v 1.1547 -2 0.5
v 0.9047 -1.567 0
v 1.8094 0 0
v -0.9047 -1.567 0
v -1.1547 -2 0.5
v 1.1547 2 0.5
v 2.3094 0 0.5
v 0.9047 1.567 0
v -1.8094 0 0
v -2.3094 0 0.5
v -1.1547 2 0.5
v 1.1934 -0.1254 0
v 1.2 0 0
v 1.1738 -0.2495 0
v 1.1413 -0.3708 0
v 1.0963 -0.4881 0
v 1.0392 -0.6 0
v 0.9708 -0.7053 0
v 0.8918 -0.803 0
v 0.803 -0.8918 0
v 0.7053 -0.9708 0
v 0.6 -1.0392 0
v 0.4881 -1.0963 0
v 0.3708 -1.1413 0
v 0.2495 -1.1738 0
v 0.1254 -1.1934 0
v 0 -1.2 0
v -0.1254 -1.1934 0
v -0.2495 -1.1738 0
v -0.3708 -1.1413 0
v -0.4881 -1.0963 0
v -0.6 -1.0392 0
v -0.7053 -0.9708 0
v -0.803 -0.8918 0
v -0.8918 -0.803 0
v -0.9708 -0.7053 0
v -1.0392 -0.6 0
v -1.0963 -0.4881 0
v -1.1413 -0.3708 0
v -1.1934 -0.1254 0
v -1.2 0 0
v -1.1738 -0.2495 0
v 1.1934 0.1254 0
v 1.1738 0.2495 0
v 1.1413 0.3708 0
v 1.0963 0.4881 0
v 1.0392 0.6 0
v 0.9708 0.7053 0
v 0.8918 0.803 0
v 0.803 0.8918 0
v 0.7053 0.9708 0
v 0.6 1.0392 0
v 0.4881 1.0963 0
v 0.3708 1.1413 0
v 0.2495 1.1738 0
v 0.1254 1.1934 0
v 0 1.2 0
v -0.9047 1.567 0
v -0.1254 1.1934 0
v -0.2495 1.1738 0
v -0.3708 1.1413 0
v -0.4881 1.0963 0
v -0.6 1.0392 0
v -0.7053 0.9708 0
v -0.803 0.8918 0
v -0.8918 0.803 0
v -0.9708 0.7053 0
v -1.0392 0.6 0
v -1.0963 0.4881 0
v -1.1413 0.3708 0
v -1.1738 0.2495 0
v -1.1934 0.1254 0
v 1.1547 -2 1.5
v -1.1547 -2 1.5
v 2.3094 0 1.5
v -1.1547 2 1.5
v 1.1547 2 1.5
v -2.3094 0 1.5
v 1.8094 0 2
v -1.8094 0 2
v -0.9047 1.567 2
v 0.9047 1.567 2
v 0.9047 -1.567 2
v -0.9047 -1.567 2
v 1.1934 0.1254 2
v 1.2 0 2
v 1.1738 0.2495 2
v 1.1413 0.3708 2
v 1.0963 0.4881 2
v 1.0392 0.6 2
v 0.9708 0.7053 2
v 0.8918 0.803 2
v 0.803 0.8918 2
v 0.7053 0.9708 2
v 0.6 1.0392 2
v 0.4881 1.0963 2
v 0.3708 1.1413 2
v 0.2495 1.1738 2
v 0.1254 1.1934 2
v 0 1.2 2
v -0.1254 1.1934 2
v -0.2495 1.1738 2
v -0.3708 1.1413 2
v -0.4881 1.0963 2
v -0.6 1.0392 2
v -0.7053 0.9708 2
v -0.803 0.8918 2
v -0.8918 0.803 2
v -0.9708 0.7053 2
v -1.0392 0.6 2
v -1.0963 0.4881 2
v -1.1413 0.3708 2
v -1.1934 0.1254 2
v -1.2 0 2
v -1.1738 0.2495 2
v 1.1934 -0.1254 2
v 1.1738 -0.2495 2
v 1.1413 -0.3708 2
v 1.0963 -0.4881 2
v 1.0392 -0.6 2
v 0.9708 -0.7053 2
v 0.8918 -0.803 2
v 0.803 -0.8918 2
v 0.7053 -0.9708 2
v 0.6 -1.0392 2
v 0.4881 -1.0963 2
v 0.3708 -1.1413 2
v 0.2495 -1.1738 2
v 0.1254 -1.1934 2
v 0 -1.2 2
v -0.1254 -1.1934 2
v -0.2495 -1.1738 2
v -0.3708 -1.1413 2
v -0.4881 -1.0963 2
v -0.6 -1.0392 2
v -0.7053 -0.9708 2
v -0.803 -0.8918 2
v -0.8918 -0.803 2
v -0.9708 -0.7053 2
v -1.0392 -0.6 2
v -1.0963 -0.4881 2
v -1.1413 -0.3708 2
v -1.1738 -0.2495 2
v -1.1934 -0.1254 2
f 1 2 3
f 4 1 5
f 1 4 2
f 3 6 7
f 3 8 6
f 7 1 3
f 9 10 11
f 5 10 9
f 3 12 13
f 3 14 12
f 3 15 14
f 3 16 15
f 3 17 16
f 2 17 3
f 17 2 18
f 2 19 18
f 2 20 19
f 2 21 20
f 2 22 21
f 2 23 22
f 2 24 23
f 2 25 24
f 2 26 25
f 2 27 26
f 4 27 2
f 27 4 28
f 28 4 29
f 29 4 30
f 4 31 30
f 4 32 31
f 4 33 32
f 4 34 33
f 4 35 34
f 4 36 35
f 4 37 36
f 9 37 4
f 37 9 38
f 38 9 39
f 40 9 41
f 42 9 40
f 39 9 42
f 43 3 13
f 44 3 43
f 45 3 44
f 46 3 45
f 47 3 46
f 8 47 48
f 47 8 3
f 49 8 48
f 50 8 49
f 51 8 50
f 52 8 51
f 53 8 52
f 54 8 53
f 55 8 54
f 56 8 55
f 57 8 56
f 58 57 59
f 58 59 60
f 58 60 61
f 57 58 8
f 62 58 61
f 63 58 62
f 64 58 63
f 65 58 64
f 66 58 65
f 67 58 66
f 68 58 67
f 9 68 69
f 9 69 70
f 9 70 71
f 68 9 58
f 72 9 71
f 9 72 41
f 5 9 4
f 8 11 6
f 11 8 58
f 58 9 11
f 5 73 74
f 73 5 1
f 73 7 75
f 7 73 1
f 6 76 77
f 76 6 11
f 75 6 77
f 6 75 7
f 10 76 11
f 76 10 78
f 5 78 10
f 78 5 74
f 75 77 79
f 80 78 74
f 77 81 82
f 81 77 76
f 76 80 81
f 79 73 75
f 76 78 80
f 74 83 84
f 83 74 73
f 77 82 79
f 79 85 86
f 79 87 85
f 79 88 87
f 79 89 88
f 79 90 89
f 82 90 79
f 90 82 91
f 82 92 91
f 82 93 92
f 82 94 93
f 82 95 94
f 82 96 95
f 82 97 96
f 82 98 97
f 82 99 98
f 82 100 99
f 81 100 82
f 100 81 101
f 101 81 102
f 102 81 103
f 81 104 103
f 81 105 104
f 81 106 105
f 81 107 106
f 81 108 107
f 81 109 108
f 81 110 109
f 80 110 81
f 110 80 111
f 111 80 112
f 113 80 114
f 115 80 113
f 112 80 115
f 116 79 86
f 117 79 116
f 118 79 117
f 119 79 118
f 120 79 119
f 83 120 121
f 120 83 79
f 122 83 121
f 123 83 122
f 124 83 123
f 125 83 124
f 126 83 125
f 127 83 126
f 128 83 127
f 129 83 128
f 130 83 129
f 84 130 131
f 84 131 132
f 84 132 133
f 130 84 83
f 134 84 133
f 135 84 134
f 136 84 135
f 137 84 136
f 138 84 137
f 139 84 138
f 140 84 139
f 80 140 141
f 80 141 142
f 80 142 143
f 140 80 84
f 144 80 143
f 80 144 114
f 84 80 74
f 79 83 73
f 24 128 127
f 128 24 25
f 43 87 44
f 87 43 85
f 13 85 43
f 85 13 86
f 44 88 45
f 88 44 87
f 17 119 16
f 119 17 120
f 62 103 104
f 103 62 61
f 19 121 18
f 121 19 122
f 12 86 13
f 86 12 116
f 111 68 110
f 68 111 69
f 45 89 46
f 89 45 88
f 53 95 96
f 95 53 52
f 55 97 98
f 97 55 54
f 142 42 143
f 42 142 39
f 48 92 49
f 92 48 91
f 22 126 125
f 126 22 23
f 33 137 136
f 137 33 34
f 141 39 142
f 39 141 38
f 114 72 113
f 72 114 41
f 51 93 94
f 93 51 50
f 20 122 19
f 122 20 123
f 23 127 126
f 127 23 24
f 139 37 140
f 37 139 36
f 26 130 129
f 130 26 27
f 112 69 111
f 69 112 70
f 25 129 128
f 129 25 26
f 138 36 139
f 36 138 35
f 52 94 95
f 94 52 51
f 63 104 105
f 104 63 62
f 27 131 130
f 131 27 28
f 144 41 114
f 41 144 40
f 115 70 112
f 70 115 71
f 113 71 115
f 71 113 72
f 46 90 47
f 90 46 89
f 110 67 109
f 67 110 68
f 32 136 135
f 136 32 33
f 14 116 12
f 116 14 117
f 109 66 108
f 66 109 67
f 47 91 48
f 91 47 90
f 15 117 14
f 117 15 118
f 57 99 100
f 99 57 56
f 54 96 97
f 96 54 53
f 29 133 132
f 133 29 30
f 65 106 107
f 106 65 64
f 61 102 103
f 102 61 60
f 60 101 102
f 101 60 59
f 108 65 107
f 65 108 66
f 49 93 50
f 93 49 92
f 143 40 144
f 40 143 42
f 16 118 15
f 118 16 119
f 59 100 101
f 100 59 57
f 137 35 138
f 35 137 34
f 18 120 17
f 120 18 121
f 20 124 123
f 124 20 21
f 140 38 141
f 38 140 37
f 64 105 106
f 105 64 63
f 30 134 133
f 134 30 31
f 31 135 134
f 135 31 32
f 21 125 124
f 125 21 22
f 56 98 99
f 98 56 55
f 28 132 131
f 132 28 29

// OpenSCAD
// Through hex nut.
$fn = 60;
eps = 0.02;
thread_clearance_d = 2.4;
flat = 4;
thickness = 2;
chamfer = 0.5;
difference() {
    union() {
        cylinder(d1 = flat / cos(30) - 2 * chamfer, d2 = flat / cos(30), h = chamfer, $fn = 6);
        translate([0, 0, chamfer]) cylinder(d = flat / cos(30), h = thickness - 2 * chamfer, $fn = 6);
        translate([0, 0, thickness - chamfer]) cylinder(d1 = flat / cos(30), d2 = flat / cos(30) - 2 * chamfer, h = chamfer, $fn = 6);
    }
    translate([0, 0, -eps]) cylinder(d = thread_clearance_d, h = thickness + 2 * eps);
}
